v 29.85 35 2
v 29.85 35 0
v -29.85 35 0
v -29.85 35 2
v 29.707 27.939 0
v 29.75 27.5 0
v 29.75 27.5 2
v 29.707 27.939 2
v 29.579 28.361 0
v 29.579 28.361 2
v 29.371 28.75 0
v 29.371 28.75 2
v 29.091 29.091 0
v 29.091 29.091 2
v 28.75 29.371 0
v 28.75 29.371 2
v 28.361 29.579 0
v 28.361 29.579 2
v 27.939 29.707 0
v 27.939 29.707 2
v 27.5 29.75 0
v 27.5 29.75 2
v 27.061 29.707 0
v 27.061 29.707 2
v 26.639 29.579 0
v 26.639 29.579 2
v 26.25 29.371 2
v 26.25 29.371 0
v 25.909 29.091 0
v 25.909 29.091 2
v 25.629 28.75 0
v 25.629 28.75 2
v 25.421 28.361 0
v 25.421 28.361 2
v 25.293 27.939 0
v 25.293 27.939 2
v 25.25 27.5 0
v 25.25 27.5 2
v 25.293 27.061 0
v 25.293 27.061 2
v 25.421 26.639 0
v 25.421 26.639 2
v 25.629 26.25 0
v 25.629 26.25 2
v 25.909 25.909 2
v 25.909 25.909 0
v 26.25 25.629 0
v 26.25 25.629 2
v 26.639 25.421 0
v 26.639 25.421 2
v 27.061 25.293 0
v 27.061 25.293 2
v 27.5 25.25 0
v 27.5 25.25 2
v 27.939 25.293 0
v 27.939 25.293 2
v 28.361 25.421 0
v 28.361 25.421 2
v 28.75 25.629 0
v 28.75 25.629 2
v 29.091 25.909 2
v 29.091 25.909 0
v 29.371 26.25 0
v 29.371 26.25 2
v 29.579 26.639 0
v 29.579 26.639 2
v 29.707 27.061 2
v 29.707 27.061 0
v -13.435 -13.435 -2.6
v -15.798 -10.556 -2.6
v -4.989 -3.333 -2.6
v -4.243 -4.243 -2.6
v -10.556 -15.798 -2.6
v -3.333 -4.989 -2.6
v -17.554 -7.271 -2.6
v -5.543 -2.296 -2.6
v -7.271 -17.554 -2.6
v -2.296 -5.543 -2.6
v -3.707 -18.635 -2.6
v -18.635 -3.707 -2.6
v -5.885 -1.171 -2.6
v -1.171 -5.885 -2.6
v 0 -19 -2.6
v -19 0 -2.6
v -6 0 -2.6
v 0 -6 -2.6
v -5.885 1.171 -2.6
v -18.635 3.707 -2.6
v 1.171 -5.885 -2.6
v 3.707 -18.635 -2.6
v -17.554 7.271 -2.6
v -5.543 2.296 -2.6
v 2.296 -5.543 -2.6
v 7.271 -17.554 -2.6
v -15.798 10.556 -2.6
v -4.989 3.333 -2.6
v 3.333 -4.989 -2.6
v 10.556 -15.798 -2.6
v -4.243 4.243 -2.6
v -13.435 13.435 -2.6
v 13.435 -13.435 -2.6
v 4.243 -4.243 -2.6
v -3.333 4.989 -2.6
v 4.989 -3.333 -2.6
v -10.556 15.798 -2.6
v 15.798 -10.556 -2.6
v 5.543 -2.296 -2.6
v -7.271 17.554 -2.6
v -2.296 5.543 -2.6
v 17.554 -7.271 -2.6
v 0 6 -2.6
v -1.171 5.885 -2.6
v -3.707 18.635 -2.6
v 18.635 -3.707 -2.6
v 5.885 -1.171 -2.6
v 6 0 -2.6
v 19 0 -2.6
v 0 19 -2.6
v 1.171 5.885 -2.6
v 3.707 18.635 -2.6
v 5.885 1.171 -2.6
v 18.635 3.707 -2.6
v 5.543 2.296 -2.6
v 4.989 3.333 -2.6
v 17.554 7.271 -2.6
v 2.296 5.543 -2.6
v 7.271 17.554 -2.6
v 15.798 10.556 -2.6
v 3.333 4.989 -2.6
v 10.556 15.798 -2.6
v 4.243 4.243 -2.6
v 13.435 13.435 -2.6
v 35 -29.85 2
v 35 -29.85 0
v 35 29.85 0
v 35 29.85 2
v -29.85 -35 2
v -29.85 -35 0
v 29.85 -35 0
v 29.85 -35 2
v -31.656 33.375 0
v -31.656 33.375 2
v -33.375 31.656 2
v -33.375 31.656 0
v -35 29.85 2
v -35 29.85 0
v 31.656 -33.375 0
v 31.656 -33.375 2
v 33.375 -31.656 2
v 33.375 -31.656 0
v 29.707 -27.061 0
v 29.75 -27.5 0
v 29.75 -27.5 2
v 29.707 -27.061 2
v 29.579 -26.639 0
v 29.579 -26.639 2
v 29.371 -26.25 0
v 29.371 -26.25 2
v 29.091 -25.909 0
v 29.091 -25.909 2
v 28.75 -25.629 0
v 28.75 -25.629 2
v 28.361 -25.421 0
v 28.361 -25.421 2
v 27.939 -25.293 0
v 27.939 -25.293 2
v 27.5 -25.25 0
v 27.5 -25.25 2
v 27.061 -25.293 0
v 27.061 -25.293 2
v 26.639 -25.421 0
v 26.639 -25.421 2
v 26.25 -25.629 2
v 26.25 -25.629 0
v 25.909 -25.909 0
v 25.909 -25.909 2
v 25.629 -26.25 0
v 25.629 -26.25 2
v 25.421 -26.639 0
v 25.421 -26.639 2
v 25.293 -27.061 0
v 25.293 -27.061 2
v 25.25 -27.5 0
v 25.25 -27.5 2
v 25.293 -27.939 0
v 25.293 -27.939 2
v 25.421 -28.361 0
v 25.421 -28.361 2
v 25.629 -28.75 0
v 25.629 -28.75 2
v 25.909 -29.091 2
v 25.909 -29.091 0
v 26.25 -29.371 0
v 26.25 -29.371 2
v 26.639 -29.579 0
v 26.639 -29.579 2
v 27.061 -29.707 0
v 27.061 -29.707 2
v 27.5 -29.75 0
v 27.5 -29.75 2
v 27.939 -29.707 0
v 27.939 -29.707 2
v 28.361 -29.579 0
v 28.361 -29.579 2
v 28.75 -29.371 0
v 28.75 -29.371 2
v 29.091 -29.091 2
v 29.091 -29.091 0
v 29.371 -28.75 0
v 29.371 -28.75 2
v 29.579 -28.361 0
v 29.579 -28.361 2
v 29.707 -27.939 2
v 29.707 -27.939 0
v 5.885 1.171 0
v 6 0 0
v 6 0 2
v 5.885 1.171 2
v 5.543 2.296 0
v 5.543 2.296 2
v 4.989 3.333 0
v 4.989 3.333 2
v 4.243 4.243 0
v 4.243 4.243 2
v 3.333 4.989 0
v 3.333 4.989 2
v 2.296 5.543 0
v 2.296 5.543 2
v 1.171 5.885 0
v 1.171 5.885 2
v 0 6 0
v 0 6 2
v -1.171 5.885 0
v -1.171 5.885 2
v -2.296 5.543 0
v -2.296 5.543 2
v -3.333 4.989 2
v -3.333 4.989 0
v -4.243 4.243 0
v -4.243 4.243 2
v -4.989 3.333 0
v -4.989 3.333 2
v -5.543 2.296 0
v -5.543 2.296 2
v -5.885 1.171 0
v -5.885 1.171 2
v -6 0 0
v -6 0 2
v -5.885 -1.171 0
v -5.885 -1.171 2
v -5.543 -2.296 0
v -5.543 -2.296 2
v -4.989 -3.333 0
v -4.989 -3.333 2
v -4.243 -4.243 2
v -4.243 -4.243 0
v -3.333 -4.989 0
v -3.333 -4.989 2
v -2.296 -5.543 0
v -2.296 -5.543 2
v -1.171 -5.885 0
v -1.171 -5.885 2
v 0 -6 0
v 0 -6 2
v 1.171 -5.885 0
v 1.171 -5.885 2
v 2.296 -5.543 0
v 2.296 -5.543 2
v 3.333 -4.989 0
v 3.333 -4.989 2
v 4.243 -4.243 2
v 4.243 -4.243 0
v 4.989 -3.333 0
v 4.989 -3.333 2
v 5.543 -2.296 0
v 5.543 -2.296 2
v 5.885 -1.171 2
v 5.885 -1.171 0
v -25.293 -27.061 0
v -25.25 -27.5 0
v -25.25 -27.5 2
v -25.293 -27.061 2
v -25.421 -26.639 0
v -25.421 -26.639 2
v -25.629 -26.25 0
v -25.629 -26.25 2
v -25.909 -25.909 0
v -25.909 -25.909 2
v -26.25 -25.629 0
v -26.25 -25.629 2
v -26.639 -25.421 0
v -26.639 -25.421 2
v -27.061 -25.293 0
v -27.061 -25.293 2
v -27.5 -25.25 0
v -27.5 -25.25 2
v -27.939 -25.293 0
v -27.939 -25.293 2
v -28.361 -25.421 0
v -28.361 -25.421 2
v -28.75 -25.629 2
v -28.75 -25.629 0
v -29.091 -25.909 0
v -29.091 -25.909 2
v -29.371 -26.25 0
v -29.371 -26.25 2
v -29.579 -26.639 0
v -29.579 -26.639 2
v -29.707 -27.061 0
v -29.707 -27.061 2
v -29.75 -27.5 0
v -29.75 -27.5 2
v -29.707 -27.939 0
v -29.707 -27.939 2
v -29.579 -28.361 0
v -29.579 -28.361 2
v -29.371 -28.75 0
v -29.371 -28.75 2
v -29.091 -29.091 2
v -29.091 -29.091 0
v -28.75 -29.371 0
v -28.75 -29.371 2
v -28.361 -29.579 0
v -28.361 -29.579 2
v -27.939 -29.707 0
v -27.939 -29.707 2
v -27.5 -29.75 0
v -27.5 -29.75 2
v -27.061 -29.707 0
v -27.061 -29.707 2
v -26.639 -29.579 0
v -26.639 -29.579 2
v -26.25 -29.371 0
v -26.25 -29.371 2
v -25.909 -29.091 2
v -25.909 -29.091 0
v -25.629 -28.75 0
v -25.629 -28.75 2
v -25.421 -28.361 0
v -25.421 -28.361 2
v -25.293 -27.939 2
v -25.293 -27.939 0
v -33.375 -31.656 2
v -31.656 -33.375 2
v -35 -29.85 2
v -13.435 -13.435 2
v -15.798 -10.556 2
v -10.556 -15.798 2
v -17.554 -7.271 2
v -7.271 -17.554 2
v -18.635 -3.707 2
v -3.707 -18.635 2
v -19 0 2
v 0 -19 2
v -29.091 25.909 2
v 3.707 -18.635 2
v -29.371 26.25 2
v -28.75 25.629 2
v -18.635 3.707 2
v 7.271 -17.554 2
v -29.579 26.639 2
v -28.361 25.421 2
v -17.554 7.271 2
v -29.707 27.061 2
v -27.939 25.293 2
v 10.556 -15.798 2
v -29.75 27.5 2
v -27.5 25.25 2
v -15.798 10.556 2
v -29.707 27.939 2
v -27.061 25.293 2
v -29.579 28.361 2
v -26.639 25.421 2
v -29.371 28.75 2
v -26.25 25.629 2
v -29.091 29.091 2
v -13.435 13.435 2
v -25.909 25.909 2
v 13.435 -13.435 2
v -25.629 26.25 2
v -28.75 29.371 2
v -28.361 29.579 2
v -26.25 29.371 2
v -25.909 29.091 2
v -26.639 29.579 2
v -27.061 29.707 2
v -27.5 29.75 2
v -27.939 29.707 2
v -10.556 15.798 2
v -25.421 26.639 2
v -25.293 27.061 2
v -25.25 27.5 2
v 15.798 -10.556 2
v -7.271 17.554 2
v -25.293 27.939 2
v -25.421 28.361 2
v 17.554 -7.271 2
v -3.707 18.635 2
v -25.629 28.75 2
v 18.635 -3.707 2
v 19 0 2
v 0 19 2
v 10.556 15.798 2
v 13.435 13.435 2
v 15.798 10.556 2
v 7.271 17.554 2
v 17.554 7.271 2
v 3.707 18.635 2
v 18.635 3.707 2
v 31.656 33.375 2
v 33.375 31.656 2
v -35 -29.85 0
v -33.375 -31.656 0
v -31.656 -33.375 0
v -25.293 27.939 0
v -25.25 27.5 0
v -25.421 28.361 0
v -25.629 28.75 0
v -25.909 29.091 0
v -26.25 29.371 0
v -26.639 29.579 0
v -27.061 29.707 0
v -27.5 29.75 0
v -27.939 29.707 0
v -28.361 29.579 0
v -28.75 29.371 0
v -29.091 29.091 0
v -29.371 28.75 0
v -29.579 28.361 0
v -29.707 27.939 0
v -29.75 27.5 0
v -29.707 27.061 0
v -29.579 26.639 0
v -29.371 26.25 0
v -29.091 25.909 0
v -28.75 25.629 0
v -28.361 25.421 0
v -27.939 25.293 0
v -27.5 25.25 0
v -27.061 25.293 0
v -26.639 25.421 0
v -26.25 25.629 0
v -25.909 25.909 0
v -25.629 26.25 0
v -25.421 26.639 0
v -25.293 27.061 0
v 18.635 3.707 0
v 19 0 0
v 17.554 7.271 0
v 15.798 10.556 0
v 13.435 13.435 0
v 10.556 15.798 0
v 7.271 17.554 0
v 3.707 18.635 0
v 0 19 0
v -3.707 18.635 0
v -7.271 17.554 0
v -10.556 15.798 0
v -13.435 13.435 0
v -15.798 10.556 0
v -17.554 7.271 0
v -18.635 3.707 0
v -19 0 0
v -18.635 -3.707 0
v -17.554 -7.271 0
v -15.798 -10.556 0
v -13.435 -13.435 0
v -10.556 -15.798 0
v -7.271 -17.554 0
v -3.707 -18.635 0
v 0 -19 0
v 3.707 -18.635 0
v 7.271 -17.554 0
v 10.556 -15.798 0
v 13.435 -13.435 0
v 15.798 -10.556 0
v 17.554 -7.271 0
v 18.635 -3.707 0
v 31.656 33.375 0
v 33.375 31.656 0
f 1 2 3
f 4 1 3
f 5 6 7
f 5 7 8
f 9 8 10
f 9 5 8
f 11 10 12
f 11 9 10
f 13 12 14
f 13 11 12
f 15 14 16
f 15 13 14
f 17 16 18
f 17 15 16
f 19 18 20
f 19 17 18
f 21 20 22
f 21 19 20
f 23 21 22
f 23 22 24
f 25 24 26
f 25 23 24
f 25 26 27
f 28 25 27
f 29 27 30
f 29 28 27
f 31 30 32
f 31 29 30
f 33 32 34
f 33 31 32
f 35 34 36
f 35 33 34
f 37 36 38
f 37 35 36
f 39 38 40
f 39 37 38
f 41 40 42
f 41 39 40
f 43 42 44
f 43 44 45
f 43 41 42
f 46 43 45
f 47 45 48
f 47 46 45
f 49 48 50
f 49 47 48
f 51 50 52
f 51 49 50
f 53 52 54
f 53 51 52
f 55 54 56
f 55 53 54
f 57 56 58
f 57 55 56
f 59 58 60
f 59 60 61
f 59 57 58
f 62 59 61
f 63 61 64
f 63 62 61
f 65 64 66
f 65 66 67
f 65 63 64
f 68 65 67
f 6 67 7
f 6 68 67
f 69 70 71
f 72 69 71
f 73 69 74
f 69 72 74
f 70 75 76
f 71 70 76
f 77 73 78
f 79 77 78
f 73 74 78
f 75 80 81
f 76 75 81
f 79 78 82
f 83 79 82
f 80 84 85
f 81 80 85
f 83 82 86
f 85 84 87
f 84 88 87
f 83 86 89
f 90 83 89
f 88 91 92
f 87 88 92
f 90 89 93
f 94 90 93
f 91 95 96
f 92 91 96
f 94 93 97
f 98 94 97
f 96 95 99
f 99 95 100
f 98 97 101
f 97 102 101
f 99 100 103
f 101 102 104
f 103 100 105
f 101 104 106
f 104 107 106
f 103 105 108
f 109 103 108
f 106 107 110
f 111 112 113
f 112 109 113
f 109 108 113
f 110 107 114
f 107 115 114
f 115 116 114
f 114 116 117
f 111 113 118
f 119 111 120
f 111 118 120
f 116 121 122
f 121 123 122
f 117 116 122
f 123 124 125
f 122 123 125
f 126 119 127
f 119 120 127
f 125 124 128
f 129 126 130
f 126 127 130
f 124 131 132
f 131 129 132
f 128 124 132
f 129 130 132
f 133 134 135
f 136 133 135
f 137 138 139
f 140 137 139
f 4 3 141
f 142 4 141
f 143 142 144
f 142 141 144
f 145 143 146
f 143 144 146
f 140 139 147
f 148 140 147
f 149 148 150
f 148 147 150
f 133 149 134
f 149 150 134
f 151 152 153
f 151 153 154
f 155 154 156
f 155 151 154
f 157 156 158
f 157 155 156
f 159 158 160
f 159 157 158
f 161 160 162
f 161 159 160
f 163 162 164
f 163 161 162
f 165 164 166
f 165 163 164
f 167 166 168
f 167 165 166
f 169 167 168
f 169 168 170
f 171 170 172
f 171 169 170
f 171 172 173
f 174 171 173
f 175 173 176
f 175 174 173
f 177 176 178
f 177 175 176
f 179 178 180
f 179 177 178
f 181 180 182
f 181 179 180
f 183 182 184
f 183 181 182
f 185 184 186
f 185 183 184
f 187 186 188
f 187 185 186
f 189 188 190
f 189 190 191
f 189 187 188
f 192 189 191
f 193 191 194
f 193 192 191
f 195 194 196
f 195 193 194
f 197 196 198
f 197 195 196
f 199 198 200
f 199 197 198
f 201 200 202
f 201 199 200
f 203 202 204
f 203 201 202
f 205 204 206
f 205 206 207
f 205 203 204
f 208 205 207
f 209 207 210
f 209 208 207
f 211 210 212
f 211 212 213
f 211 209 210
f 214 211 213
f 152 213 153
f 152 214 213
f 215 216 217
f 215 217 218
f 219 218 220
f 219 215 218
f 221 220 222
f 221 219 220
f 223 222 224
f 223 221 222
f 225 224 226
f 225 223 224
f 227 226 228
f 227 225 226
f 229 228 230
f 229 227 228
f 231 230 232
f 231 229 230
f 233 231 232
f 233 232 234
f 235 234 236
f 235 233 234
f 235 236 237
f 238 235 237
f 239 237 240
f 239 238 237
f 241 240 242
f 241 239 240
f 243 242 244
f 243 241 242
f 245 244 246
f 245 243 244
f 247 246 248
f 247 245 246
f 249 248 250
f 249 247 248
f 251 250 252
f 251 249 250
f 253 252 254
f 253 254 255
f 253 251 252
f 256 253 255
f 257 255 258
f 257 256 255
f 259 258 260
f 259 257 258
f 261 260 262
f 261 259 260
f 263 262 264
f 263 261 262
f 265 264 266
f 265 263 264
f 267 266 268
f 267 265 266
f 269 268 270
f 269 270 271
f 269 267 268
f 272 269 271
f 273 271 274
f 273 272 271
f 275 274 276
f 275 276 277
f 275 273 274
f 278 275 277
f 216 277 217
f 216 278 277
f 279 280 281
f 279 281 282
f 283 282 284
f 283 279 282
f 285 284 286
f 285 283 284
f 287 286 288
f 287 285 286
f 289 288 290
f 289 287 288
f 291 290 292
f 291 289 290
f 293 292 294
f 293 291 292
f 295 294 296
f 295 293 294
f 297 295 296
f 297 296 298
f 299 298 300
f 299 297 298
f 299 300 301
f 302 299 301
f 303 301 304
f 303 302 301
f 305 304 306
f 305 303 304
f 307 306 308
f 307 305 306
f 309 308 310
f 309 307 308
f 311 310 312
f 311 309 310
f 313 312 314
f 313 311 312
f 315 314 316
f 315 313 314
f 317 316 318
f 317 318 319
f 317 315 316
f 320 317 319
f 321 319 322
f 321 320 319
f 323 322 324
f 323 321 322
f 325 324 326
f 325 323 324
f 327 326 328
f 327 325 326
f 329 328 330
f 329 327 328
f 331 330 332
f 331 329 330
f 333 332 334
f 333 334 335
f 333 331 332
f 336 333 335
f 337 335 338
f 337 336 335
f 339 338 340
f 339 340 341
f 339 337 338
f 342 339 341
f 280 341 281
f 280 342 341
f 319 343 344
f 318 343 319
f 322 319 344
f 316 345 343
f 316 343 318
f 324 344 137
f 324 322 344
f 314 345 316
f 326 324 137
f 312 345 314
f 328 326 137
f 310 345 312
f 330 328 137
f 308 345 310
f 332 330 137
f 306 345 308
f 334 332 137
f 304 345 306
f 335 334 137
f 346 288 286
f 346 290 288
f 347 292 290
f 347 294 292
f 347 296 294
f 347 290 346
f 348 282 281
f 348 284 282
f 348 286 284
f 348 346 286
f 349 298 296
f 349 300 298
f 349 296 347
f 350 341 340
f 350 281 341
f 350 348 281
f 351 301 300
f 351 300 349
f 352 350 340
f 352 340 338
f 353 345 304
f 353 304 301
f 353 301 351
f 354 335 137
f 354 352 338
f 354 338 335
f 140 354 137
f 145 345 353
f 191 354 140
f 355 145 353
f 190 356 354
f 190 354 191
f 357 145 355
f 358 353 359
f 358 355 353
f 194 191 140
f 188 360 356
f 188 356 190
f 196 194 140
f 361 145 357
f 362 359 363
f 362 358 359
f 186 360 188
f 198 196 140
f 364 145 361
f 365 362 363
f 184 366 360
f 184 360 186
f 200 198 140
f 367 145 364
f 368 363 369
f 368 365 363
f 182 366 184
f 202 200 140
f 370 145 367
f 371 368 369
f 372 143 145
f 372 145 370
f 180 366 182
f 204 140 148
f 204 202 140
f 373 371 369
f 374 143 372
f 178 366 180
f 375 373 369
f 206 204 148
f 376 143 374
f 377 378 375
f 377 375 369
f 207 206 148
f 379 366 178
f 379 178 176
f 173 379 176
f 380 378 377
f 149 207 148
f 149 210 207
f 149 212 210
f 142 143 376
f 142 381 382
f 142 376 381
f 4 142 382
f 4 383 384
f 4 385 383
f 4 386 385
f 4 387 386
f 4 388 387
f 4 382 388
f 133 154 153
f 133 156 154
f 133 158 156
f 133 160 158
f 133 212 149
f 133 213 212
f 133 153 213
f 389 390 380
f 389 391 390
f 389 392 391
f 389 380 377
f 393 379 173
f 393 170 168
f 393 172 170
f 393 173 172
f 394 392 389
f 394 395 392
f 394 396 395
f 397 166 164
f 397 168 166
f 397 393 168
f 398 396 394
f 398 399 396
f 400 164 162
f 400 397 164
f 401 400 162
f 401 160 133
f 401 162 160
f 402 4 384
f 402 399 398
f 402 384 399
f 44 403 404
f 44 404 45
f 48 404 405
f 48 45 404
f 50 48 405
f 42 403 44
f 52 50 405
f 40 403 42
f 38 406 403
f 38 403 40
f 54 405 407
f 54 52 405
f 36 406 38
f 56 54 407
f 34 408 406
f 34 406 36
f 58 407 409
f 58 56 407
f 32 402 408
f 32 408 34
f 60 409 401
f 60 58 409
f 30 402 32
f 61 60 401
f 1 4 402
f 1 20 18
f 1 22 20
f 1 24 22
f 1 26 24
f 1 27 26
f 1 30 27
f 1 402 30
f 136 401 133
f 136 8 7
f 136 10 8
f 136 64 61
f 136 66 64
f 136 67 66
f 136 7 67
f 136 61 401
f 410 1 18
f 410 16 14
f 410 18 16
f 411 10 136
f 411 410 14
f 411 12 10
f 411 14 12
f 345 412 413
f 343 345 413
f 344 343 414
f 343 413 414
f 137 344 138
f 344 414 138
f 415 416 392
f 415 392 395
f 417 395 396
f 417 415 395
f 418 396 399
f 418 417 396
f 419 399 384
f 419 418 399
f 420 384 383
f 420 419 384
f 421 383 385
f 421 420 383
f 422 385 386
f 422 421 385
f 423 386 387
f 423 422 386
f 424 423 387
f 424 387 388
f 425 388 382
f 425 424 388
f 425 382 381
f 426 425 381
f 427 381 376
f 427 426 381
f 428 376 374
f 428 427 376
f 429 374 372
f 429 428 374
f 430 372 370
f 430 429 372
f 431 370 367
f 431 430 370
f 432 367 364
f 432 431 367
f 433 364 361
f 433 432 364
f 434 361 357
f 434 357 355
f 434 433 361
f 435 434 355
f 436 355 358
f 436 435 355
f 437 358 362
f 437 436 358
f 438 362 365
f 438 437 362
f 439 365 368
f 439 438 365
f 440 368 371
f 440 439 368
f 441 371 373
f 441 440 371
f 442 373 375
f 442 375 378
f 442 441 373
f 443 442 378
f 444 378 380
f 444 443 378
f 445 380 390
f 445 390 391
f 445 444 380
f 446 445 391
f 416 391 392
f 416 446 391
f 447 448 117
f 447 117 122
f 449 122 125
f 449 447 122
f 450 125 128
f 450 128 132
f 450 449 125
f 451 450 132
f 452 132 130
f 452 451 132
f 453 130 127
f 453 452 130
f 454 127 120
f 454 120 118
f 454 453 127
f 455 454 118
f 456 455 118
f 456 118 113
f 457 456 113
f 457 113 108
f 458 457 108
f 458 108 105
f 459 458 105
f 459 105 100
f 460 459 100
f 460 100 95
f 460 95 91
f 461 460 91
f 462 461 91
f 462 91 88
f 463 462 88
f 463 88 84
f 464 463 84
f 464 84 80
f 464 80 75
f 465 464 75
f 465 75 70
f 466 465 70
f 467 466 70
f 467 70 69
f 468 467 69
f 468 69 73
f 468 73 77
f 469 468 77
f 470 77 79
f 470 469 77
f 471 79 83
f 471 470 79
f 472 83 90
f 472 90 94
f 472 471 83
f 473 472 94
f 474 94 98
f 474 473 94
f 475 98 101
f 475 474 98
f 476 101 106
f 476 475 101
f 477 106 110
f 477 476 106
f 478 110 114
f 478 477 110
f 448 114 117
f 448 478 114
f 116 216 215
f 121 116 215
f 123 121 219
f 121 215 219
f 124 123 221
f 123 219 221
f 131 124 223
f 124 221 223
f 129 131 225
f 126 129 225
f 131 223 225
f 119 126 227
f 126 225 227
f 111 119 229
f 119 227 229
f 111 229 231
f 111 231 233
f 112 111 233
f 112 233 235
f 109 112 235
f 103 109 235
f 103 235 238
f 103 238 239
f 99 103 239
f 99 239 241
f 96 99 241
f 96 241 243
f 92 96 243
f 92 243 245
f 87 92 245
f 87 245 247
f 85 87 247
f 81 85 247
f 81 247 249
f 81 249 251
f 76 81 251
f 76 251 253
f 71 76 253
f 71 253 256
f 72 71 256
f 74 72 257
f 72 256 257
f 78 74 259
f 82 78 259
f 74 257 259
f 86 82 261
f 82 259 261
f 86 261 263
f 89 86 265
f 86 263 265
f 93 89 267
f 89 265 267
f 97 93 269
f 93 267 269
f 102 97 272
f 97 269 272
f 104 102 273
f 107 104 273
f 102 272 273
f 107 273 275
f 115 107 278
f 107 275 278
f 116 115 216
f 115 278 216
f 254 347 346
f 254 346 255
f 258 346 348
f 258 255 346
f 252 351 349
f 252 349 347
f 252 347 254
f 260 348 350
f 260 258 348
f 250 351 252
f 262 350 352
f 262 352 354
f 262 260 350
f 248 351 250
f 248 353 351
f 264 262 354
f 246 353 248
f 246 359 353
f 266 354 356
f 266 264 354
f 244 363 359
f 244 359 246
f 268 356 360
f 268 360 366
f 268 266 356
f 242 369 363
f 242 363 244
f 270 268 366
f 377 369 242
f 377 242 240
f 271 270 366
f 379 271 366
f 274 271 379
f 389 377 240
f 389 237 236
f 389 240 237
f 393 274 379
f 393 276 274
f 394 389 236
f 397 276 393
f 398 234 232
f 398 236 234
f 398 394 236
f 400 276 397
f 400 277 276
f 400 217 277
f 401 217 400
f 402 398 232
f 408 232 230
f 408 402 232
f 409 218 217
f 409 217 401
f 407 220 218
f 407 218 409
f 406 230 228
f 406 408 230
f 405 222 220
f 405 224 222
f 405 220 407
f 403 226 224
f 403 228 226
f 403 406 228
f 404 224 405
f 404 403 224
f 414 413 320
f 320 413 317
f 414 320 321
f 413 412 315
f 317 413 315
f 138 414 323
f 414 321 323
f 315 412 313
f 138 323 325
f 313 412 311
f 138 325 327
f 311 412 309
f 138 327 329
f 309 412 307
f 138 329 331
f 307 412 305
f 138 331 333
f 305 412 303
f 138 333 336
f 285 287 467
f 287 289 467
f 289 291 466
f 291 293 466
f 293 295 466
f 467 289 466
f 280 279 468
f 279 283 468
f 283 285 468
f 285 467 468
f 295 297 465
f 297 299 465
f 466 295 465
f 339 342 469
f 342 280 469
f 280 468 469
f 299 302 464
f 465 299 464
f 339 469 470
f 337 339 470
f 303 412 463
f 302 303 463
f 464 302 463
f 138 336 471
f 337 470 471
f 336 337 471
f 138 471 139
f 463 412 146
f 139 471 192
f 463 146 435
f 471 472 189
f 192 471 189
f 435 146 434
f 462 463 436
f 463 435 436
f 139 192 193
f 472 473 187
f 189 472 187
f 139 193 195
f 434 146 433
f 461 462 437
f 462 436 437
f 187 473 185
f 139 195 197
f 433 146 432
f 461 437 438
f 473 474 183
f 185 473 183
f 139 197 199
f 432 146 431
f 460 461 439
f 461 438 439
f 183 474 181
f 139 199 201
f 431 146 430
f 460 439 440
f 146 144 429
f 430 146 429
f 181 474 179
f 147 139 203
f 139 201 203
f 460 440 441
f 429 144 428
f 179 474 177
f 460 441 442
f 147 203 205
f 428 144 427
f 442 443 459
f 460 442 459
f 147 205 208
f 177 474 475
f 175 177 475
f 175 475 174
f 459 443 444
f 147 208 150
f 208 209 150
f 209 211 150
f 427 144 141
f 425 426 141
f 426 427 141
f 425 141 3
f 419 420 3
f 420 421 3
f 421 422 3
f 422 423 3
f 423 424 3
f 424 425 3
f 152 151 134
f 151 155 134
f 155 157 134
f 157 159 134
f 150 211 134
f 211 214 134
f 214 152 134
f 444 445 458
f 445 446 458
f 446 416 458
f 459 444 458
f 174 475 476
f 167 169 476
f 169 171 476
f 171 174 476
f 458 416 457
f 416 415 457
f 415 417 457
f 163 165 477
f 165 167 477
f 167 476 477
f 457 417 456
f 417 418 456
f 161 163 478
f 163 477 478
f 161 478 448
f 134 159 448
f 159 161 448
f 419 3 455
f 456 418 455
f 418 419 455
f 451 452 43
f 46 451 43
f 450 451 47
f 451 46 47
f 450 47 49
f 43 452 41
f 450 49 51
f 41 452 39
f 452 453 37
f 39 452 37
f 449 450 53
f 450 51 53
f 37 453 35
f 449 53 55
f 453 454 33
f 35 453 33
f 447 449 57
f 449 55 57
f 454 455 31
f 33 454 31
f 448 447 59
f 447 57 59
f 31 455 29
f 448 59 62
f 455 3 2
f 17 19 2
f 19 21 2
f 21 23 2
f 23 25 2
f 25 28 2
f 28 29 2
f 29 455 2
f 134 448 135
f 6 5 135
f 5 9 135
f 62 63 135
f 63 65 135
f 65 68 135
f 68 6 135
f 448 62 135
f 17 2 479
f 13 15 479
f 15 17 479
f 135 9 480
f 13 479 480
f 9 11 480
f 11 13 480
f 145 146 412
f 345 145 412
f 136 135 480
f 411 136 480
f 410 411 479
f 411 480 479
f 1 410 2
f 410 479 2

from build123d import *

# Parameters (mm, degrees)
F0_R     = 2.25
F0_R_2   = 6
F1_DEPTH = 2
F2_R     = 19
F2_R_2   = 6
F3_DEPTH = 4.6


with BuildPart() as f1:
    # F0 (on Top) → F1 (new body)
    with BuildSketch(Plane.XY):
        with BuildLine():
            Line((29.849623, 35), (-29.849623, 35))
            ThreePointArc((-29.849623, 35), (-32.526912, 32.526912), (-35, 29.849623))
            Line((-35, 29.849623), (-35, -29.849623))
            ThreePointArc((-35, -29.849623), (-32.526912, -32.526912), (-29.849623, -35))
            Line((-29.849623, -35), (29.849623, -35))
            ThreePointArc((29.849623, -35), (32.526912, -32.526912), (35, -29.849623))
            Line((35, -29.849623), (35, 29.849623))
            ThreePointArc((35, 29.849623), (32.526912, 32.526912), (29.849623, 35))
        make_face()
        with Locations((-27.5, -27.5)):
            Circle(F0_R, mode=Mode.SUBTRACT)
        with Locations((27.5, -27.5)):
            Circle(F0_R, mode=Mode.SUBTRACT)
        Circle(F0_R_2, mode=Mode.SUBTRACT)
        with Locations((-27.5, 27.5)):
            Circle(F0_R, mode=Mode.SUBTRACT)
        with Locations((27.5, 27.5)):
            Circle(F0_R, mode=Mode.SUBTRACT)
    extrude(amount=F1_DEPTH)

    # F2 (on face) → F3 (join)
    with BuildSketch(Plane.XY.offset(2)):
        Circle(F2_R)
        Circle(F2_R_2, mode=Mode.SUBTRACT)
    extrude(amount=-F3_DEPTH)


solid = f1.part
